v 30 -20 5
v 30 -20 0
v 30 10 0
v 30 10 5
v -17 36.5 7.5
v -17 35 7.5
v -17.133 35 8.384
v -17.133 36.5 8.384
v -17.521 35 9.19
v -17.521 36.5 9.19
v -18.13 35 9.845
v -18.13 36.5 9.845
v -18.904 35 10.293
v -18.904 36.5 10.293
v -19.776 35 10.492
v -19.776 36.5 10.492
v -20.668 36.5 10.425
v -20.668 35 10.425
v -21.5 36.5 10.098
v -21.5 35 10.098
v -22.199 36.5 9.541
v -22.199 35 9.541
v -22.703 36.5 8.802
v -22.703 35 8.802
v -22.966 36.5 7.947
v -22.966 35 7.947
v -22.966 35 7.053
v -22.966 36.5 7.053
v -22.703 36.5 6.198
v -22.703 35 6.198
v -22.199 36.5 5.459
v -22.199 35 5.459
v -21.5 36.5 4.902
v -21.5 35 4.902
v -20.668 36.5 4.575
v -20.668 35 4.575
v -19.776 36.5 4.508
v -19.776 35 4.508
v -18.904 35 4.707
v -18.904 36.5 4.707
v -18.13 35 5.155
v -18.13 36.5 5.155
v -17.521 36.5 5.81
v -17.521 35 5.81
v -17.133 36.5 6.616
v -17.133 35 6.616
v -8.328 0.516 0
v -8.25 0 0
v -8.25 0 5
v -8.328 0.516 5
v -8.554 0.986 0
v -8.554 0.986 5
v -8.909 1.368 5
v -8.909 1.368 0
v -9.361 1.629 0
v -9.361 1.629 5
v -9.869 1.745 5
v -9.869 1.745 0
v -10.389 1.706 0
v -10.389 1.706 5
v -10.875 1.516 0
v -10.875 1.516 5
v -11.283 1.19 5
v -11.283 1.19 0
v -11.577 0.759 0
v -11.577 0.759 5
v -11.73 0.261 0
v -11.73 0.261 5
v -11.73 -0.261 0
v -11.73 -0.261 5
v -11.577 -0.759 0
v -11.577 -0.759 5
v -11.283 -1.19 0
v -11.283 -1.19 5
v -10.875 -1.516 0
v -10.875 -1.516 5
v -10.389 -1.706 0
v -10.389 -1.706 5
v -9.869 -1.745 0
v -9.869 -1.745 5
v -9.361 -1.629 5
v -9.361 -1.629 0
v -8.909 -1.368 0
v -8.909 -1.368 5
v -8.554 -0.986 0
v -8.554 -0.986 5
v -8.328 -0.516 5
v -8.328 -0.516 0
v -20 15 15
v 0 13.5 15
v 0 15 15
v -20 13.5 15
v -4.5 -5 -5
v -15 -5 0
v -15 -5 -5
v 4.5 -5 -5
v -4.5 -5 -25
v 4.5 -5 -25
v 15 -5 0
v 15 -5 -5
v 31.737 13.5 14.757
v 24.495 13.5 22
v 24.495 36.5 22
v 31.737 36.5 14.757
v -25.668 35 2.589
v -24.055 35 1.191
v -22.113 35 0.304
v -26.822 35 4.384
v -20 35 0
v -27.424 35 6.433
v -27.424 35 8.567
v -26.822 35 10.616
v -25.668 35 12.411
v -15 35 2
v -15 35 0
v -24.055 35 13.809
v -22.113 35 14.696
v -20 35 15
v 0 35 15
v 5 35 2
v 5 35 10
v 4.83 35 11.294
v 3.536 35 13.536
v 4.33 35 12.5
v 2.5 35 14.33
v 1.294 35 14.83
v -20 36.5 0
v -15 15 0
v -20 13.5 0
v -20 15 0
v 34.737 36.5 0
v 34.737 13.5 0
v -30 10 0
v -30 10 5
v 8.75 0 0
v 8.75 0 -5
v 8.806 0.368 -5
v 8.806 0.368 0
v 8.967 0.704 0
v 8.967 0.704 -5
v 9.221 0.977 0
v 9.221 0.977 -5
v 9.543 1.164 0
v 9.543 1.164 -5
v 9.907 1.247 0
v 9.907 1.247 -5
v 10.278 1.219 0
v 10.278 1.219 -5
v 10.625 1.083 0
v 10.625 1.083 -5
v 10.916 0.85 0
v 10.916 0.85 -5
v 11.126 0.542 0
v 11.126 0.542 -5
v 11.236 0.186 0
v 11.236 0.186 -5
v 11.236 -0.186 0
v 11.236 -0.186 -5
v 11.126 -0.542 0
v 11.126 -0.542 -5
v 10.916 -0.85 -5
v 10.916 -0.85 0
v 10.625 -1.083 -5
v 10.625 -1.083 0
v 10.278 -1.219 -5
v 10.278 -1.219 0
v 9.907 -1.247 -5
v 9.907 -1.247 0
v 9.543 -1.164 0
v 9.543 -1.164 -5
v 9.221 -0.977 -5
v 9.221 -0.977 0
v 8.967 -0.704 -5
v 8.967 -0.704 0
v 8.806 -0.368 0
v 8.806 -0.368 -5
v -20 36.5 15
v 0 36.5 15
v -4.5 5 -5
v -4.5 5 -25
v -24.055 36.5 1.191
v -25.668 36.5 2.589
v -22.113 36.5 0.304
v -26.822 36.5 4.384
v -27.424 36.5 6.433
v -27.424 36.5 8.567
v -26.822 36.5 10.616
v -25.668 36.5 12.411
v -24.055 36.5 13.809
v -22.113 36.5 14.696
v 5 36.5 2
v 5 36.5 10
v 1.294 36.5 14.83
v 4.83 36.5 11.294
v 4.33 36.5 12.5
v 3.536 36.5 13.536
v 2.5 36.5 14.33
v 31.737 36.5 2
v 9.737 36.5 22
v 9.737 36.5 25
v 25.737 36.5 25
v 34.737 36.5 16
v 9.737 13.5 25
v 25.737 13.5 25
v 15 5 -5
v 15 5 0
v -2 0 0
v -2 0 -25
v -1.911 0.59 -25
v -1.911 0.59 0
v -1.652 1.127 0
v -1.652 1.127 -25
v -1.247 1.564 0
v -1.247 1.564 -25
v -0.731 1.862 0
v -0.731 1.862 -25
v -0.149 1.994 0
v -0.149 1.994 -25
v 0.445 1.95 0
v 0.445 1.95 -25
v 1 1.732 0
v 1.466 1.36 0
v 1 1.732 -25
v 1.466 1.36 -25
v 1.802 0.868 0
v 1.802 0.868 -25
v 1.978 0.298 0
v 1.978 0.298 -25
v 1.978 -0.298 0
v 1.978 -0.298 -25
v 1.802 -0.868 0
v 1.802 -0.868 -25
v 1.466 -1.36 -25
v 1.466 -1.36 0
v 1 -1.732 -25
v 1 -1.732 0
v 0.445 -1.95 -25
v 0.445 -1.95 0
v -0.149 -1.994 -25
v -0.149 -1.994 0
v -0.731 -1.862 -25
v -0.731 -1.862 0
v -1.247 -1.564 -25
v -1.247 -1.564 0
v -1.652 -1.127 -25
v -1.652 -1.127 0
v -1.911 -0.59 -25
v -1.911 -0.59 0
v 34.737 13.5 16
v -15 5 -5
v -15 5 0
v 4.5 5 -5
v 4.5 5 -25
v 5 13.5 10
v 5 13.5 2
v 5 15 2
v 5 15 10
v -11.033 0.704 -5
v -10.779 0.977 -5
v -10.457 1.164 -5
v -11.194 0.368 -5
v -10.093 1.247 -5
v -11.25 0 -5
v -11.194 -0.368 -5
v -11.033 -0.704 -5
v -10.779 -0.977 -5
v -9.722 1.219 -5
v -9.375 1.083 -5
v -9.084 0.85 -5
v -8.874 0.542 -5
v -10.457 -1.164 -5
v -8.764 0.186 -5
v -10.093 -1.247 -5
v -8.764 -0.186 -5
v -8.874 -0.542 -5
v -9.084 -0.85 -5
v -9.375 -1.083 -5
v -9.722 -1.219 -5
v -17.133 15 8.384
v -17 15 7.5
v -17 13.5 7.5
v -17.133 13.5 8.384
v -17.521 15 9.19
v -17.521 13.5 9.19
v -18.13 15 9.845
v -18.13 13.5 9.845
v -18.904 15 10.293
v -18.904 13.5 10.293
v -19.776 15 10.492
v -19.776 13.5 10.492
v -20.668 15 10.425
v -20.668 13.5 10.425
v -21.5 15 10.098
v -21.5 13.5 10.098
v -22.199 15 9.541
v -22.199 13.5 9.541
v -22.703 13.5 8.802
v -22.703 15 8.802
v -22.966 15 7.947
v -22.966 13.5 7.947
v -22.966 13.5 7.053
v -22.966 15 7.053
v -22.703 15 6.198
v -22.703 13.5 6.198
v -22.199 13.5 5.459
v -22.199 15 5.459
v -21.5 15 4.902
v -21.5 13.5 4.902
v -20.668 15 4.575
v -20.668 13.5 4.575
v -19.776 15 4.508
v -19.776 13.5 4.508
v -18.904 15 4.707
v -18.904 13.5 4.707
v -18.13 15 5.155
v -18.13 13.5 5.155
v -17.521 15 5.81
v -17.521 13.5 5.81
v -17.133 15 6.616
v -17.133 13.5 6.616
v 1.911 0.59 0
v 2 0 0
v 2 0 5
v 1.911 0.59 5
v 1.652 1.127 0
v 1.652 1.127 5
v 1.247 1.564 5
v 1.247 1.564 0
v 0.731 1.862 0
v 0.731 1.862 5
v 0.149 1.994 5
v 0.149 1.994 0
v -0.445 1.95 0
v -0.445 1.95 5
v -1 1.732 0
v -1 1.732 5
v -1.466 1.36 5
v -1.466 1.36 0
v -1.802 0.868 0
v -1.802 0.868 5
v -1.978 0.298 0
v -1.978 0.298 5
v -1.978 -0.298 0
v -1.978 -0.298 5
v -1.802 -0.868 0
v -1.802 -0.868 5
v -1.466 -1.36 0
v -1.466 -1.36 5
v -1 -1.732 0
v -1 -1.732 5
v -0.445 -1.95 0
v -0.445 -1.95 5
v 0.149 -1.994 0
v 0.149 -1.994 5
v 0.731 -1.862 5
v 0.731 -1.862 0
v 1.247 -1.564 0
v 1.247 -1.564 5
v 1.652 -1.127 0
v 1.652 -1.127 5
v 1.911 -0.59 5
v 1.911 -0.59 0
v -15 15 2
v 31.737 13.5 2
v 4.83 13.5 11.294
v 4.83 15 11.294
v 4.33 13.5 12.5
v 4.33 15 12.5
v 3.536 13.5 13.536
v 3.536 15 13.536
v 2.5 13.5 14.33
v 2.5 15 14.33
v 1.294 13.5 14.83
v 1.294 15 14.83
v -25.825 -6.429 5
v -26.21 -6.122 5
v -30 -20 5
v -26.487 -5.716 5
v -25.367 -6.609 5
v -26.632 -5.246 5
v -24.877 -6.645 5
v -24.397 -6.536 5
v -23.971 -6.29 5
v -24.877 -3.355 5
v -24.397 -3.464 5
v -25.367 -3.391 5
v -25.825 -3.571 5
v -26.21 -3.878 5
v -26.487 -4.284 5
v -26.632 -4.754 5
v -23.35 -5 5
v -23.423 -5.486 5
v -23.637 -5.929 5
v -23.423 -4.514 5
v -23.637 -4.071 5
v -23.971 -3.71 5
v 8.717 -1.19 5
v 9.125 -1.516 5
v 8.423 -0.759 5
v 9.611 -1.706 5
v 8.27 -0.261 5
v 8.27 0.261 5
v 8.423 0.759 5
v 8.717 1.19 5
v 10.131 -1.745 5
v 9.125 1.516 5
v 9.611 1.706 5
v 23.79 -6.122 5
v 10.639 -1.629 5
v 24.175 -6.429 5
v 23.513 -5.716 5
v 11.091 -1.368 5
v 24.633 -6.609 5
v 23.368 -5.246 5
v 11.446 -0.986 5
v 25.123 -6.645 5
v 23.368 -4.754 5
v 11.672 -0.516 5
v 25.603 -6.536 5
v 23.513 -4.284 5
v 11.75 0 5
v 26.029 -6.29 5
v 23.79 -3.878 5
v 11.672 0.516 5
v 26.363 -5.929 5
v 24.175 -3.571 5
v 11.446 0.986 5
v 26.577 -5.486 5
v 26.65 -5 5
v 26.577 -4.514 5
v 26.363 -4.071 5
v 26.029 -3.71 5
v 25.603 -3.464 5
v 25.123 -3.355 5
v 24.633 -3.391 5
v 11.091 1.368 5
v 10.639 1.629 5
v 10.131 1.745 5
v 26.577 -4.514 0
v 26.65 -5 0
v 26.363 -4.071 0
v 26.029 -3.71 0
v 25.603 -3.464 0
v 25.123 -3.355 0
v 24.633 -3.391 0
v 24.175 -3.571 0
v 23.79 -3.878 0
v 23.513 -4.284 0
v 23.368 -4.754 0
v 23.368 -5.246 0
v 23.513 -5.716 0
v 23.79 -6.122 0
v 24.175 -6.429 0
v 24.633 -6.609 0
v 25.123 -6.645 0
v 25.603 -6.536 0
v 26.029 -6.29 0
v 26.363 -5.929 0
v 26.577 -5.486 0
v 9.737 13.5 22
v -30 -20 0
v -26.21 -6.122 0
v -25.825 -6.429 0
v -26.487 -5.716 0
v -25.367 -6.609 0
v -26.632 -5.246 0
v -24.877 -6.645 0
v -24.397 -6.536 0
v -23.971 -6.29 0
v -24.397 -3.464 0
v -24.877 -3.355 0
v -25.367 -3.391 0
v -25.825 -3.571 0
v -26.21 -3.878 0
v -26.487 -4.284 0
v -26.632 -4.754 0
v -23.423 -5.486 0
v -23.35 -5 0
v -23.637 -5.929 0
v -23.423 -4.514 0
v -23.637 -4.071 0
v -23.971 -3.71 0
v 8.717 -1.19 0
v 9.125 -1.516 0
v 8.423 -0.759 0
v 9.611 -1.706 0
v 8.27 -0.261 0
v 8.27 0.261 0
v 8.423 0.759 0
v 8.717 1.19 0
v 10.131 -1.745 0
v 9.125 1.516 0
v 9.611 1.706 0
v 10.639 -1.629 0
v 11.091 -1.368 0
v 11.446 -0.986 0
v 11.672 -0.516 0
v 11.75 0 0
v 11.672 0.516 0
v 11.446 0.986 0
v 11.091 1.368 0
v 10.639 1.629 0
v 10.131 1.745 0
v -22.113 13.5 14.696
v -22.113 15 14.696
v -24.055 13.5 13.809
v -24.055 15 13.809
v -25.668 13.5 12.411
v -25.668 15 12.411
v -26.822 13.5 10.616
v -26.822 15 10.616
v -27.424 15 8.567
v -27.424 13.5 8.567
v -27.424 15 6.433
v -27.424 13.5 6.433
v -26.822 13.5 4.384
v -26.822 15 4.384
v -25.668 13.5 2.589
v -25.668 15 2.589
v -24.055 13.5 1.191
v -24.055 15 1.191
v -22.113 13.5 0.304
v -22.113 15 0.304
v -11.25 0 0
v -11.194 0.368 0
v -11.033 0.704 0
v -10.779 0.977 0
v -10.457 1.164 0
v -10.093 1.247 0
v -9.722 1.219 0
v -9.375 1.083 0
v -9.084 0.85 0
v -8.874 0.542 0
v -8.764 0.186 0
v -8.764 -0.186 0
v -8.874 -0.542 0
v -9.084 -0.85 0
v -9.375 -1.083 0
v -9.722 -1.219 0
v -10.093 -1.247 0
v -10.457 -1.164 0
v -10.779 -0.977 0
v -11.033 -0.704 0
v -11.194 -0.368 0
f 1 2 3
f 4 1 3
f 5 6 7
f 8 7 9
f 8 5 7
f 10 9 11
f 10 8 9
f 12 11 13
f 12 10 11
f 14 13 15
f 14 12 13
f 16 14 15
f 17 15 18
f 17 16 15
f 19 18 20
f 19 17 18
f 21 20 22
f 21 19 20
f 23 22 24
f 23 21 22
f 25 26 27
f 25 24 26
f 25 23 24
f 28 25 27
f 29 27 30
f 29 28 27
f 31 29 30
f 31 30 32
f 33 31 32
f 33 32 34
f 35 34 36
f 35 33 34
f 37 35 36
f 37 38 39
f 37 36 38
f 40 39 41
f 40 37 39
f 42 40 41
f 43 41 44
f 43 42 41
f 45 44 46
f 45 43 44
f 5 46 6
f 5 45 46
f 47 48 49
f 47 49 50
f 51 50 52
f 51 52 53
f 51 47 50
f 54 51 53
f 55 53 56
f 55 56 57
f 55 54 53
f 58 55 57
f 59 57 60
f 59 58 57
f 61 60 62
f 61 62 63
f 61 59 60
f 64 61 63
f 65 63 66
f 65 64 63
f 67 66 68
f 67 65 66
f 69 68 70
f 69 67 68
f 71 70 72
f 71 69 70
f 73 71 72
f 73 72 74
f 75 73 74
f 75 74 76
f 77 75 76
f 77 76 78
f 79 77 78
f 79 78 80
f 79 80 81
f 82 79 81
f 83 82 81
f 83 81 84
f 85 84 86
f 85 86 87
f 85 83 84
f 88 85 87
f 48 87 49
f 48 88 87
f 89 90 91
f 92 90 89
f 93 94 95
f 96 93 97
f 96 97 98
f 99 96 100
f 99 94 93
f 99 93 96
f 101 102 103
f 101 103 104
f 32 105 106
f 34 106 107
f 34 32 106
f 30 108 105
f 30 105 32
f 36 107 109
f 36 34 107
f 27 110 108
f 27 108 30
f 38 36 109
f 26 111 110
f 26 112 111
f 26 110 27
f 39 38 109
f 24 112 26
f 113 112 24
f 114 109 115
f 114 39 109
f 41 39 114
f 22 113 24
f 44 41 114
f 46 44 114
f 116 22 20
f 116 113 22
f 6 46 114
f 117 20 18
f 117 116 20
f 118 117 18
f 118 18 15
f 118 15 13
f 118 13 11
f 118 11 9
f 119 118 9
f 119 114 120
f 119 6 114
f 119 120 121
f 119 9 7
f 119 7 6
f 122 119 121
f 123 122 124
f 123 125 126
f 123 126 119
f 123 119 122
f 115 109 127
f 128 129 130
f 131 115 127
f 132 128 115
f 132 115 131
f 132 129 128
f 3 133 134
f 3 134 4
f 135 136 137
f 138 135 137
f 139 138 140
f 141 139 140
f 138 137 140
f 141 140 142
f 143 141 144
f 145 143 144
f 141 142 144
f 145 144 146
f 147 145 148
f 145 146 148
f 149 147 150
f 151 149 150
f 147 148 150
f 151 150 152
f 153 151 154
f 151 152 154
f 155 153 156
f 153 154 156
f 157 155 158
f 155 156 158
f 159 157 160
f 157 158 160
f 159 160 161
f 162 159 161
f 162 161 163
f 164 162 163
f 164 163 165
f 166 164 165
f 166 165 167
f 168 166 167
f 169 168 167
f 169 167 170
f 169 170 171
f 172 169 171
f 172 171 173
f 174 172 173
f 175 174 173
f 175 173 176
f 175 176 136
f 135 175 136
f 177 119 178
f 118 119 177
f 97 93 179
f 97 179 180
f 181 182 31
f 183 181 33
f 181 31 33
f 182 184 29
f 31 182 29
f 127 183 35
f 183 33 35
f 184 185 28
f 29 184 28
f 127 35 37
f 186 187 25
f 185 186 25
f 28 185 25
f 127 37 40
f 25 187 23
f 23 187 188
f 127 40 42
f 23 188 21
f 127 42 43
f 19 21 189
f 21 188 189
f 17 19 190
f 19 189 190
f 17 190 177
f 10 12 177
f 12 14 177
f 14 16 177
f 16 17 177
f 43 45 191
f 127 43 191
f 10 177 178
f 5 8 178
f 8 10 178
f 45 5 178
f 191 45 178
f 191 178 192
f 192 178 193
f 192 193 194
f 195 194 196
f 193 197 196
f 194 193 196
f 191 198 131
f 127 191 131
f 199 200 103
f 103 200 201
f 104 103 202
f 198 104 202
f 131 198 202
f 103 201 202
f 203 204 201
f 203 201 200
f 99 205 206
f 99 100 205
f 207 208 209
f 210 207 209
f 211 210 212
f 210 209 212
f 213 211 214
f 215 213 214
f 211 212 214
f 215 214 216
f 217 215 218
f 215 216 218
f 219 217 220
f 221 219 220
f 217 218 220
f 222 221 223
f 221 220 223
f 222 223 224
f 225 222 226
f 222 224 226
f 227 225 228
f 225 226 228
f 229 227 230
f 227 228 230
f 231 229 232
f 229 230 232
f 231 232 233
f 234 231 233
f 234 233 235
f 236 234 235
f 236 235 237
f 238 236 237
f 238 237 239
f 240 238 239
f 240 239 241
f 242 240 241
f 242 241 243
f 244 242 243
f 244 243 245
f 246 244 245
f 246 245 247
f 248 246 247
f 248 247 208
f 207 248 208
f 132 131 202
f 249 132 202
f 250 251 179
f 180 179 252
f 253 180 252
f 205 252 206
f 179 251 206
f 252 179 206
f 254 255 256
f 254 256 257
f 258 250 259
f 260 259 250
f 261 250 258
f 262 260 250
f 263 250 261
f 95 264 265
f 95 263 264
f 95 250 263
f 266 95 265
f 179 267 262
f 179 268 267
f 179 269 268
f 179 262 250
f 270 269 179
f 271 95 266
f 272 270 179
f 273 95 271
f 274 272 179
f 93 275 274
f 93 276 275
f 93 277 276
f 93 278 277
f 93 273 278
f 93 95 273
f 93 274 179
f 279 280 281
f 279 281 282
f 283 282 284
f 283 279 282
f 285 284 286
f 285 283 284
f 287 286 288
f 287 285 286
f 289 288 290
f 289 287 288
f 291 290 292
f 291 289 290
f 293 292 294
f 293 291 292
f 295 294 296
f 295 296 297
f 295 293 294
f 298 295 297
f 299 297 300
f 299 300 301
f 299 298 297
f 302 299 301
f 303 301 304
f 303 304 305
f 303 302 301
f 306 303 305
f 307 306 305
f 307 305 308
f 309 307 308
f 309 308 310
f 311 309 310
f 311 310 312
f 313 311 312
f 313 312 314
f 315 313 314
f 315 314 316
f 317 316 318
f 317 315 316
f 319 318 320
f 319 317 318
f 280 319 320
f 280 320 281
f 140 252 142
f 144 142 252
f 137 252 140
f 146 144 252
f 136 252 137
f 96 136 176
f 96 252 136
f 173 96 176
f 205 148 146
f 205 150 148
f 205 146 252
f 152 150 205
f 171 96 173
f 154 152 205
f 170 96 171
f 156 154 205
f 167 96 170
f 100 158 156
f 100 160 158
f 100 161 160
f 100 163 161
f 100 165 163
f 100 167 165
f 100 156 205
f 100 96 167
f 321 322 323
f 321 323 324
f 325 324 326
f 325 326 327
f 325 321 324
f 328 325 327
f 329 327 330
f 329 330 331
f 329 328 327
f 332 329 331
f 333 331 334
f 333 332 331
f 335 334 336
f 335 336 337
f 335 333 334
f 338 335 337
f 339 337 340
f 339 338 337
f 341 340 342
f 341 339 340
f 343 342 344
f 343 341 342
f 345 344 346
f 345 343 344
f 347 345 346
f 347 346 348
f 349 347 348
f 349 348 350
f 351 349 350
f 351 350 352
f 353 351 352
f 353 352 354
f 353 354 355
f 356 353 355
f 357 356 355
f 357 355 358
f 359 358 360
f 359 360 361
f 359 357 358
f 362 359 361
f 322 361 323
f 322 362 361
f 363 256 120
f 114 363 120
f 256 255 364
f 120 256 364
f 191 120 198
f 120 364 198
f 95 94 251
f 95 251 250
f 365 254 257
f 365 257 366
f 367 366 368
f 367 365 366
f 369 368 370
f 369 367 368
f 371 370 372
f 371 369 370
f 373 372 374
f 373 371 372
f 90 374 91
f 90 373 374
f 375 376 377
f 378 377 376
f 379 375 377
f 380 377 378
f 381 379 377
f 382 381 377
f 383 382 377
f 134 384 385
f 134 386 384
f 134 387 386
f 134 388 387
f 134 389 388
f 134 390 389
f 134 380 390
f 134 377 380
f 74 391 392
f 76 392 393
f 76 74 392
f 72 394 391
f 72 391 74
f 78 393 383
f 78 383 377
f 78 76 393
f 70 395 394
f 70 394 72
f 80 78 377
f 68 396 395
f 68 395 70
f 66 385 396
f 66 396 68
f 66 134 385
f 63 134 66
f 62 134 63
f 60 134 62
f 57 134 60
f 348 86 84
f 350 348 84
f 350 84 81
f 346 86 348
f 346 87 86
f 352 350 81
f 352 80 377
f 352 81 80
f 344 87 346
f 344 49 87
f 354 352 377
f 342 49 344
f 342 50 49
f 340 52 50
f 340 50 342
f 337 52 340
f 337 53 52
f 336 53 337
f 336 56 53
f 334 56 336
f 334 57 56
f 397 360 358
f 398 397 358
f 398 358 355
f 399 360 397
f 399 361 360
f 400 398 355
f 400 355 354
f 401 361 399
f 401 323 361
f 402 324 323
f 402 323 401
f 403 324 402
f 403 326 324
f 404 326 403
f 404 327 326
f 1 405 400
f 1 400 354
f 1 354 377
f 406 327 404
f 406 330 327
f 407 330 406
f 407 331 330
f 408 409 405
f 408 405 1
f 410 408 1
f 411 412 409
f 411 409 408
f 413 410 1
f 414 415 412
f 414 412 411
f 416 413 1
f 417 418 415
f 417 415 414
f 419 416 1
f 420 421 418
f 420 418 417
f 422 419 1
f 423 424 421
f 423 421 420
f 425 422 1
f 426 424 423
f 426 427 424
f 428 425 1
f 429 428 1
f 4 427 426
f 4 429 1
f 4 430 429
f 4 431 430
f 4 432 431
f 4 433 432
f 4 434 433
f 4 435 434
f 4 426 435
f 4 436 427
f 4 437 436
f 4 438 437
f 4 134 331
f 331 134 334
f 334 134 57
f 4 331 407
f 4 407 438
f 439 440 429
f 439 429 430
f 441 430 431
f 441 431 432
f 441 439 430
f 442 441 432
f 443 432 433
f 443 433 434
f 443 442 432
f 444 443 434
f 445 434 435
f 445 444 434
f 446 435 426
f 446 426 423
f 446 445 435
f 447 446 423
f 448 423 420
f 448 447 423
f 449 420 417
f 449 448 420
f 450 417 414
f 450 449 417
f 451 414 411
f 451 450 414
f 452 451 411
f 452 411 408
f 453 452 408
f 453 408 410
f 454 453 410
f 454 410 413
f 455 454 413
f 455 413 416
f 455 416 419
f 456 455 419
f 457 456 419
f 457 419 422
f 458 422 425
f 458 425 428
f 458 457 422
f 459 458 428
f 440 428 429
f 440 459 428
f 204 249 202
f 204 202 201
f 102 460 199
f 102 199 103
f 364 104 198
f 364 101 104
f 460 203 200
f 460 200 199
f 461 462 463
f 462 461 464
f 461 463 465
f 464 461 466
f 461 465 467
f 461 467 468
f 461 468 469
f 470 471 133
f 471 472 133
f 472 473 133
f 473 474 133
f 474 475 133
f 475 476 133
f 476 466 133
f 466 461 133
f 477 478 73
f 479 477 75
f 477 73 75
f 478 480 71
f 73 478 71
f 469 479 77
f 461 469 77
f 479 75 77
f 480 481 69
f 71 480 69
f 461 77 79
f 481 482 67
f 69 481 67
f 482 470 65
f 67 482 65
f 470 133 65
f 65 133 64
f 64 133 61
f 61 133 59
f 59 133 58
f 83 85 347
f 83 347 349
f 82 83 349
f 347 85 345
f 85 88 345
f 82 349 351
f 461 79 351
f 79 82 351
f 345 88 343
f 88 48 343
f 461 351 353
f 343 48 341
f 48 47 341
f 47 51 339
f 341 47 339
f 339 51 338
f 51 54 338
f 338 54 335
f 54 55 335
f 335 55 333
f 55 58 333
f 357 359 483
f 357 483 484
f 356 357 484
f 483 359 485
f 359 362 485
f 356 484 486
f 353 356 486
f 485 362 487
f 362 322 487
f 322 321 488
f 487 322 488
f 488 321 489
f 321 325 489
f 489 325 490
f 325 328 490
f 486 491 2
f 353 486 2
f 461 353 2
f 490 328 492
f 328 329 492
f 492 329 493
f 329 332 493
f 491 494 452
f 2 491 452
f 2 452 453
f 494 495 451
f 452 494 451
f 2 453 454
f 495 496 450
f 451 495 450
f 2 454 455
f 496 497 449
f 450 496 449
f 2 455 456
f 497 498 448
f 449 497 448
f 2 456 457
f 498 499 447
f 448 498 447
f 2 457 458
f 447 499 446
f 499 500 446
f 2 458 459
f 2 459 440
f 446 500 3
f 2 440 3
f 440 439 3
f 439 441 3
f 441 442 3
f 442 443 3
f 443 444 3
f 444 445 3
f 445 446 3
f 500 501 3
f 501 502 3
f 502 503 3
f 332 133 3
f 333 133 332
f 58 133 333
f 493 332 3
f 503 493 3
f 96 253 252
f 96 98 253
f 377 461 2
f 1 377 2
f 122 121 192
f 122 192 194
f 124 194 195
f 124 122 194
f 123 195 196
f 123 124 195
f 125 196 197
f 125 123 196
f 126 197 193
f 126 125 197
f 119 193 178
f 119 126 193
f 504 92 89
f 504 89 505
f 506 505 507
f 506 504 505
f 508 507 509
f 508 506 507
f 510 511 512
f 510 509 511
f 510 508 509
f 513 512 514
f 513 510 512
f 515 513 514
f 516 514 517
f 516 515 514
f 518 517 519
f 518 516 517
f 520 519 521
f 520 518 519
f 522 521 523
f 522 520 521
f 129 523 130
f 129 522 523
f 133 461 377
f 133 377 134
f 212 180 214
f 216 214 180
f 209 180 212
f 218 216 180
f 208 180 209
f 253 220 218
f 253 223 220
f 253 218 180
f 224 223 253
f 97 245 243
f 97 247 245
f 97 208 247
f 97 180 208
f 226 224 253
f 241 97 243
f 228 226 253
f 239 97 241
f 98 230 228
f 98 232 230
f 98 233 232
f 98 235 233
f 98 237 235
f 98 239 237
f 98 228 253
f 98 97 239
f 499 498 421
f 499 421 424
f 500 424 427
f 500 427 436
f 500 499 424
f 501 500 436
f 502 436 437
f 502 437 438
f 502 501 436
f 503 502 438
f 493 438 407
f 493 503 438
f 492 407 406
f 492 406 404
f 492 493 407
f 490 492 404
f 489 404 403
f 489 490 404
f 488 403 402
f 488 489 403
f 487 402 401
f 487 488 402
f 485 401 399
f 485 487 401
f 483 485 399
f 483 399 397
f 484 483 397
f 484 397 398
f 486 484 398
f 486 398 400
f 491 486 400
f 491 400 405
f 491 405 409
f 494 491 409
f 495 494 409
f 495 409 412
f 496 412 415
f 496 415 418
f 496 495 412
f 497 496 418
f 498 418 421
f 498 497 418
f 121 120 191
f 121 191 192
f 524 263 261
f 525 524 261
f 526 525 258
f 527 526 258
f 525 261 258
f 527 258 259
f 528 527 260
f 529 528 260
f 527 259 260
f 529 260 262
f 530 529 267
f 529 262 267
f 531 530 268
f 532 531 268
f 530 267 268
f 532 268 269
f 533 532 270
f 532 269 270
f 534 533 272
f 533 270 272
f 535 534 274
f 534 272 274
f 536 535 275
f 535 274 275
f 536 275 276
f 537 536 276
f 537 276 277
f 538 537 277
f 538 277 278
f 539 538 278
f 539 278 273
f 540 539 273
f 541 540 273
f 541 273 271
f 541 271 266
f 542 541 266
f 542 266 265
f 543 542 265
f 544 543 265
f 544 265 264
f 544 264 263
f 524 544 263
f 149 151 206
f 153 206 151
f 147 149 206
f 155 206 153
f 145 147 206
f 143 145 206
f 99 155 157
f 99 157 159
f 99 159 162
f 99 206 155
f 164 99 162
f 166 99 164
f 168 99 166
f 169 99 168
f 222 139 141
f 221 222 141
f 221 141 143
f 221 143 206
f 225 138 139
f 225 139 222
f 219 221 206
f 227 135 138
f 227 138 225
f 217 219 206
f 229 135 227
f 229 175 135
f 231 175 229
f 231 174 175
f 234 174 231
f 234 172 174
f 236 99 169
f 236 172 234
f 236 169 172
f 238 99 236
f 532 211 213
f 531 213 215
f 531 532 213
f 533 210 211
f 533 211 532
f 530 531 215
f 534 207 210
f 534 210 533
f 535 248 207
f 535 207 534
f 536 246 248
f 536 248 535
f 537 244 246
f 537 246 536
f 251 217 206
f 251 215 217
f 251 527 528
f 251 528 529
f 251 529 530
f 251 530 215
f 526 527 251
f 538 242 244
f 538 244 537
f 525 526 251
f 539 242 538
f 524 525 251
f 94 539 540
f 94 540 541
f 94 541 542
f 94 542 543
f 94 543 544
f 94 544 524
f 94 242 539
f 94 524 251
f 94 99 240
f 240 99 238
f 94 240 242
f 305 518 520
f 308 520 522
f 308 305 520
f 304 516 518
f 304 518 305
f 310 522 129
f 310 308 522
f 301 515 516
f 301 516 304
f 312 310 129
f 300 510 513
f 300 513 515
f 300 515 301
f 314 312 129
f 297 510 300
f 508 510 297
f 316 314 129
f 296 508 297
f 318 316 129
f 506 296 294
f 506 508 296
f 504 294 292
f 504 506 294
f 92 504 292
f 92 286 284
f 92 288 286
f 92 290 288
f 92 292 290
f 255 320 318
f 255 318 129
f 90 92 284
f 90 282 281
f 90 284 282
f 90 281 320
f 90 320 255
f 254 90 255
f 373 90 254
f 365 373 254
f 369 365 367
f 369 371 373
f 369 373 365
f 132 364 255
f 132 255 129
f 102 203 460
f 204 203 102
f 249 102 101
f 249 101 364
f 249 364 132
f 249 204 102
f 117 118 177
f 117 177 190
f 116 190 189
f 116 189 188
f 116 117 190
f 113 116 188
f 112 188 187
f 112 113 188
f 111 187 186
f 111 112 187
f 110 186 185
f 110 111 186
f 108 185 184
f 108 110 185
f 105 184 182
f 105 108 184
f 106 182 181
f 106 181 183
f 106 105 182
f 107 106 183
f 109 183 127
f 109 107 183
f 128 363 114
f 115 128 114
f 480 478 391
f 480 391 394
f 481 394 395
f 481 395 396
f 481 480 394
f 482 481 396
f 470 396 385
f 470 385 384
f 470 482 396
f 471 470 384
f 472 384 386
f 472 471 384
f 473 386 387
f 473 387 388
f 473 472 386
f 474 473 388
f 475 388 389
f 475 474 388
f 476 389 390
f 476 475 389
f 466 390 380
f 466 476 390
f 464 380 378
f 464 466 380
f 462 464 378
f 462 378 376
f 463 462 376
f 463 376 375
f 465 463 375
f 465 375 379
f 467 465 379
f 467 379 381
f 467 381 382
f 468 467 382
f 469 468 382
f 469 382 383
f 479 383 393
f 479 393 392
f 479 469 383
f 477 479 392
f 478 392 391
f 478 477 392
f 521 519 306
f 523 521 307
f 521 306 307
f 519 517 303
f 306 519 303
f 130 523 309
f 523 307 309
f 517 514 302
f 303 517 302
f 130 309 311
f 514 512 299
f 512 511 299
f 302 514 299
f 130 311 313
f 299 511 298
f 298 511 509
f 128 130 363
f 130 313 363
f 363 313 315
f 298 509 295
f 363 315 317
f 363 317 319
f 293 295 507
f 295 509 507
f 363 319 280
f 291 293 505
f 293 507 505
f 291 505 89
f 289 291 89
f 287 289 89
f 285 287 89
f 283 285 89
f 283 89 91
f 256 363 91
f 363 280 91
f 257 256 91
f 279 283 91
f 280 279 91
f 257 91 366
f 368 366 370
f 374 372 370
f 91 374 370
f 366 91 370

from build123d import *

# Parameters (mm, degrees)
F1_R      = 3
F2_DEPTH  = 11.5
F3_W      = 30
F3_H      = 20
F4_DEPTH  = 15.001
F5_W      = 20
F5_H      = 20
F6_DEPTH  = 32.501
F7_W      = 60
F7_H      = 30
F7_R      = 1.65
F7_R_2    = 1.75
F7_R_3    = 2
F8_DEPTH  = 5
F10_DEPTH = 5
F11_D     = 4
F12_D     = 2.5


with BuildPart() as f2:
    # F1 (on offset) → F2 (new body, symmetric)
    with BuildSketch(Plane.XZ.offset(-25)):
        with BuildLine():
            Line((-20, 0), (34.7371481067, 0))
            Line((34.7371481067, 0), (34.7371481067, 16))
            Line((34.7371481067, 16), (25.7371481067, 25))
            Line((25.7371481067, 25), (9.7371481067, 25))
            Line((9.7371481067, 25), (9.7371481067, 22))
            Line((9.7371481067, 22), (24.4945074196, 22))
            Line((24.4945074196, 22), (31.7371481067, 14.7573593129))
            Line((31.7371481067, 14.7573593129), (31.7371481067, 2))
            Line((31.7371481067, 2), (5, 2))
            Line((5, 2), (5, 10))
            ThreePointArc((5, 10), (3.5355339059, 13.5355339059), (0, 15))
            Line((0, 15), (-20, 15))
            ThreePointArc((-20, 15), (-27.5, 7.5), (-20, 0))
        make_face()
        with Locations((-20, 7.5)):
            Circle(F1_R, mode=Mode.SUBTRACT)
    extrude(amount=F2_DEPTH, both=True)

    # F3 (on face) → F4 (cut, through all)
    with BuildSketch(Plane.XY.offset(15)):
        with Locations((-30, 25)):
            Rectangle(F3_W, F3_H)
    extrude(amount=-F4_DEPTH, mode=Mode.SUBTRACT)

    # F5 (on face) → F6 (cut, through all)
    with BuildSketch(Plane.YZ.offset(5)):
        with Locations((25, 12)):
            Rectangle(F5_W, F5_H)
    extrude(amount=-F6_DEPTH, mode=Mode.SUBTRACT)


with BuildPart() as f8:
    # F7 (on Top) → F8 (new body)
    with BuildSketch(Plane.XY):
        with Locations((0, -5)):
            Rectangle(F7_W, F7_H)
        with Locations((-25, -5)):
            Circle(F7_R, mode=Mode.SUBTRACT)
        with Locations((-10, 0)):
            Circle(F7_R_2, mode=Mode.SUBTRACT)
        Circle(F7_R_3, mode=Mode.SUBTRACT)
        with Locations((10, 0)):
            Circle(F7_R_2, mode=Mode.SUBTRACT)
        with Locations((25, -5)):
            Circle(F7_R, mode=Mode.SUBTRACT)
    extrude(amount=F8_DEPTH)


with BuildPart() as f10:
    # F9 (on Front) → F10 (new body, symmetric)
    with BuildSketch(Plane.XZ):
        Polygon((15, -5), (15, 0), (-15, 0), (-15, -5), (-4.5, -5), (-4.5, -25), (4.5, -25), (4.5, -5), align=None)
    extrude(amount=F10_DEPTH, both=True)

    # F11 (through all)
    with Locations(Plane.XY):
        with Locations((0, 0)):
            Hole(F11_D / 2)

    # F12 (through all)
    with Locations(Plane.XY):
        with Locations((-10, 0), (10, 0)):
            Hole(F12_D / 2)


solid = Compound([f2.part, f8.part, f10.part])
